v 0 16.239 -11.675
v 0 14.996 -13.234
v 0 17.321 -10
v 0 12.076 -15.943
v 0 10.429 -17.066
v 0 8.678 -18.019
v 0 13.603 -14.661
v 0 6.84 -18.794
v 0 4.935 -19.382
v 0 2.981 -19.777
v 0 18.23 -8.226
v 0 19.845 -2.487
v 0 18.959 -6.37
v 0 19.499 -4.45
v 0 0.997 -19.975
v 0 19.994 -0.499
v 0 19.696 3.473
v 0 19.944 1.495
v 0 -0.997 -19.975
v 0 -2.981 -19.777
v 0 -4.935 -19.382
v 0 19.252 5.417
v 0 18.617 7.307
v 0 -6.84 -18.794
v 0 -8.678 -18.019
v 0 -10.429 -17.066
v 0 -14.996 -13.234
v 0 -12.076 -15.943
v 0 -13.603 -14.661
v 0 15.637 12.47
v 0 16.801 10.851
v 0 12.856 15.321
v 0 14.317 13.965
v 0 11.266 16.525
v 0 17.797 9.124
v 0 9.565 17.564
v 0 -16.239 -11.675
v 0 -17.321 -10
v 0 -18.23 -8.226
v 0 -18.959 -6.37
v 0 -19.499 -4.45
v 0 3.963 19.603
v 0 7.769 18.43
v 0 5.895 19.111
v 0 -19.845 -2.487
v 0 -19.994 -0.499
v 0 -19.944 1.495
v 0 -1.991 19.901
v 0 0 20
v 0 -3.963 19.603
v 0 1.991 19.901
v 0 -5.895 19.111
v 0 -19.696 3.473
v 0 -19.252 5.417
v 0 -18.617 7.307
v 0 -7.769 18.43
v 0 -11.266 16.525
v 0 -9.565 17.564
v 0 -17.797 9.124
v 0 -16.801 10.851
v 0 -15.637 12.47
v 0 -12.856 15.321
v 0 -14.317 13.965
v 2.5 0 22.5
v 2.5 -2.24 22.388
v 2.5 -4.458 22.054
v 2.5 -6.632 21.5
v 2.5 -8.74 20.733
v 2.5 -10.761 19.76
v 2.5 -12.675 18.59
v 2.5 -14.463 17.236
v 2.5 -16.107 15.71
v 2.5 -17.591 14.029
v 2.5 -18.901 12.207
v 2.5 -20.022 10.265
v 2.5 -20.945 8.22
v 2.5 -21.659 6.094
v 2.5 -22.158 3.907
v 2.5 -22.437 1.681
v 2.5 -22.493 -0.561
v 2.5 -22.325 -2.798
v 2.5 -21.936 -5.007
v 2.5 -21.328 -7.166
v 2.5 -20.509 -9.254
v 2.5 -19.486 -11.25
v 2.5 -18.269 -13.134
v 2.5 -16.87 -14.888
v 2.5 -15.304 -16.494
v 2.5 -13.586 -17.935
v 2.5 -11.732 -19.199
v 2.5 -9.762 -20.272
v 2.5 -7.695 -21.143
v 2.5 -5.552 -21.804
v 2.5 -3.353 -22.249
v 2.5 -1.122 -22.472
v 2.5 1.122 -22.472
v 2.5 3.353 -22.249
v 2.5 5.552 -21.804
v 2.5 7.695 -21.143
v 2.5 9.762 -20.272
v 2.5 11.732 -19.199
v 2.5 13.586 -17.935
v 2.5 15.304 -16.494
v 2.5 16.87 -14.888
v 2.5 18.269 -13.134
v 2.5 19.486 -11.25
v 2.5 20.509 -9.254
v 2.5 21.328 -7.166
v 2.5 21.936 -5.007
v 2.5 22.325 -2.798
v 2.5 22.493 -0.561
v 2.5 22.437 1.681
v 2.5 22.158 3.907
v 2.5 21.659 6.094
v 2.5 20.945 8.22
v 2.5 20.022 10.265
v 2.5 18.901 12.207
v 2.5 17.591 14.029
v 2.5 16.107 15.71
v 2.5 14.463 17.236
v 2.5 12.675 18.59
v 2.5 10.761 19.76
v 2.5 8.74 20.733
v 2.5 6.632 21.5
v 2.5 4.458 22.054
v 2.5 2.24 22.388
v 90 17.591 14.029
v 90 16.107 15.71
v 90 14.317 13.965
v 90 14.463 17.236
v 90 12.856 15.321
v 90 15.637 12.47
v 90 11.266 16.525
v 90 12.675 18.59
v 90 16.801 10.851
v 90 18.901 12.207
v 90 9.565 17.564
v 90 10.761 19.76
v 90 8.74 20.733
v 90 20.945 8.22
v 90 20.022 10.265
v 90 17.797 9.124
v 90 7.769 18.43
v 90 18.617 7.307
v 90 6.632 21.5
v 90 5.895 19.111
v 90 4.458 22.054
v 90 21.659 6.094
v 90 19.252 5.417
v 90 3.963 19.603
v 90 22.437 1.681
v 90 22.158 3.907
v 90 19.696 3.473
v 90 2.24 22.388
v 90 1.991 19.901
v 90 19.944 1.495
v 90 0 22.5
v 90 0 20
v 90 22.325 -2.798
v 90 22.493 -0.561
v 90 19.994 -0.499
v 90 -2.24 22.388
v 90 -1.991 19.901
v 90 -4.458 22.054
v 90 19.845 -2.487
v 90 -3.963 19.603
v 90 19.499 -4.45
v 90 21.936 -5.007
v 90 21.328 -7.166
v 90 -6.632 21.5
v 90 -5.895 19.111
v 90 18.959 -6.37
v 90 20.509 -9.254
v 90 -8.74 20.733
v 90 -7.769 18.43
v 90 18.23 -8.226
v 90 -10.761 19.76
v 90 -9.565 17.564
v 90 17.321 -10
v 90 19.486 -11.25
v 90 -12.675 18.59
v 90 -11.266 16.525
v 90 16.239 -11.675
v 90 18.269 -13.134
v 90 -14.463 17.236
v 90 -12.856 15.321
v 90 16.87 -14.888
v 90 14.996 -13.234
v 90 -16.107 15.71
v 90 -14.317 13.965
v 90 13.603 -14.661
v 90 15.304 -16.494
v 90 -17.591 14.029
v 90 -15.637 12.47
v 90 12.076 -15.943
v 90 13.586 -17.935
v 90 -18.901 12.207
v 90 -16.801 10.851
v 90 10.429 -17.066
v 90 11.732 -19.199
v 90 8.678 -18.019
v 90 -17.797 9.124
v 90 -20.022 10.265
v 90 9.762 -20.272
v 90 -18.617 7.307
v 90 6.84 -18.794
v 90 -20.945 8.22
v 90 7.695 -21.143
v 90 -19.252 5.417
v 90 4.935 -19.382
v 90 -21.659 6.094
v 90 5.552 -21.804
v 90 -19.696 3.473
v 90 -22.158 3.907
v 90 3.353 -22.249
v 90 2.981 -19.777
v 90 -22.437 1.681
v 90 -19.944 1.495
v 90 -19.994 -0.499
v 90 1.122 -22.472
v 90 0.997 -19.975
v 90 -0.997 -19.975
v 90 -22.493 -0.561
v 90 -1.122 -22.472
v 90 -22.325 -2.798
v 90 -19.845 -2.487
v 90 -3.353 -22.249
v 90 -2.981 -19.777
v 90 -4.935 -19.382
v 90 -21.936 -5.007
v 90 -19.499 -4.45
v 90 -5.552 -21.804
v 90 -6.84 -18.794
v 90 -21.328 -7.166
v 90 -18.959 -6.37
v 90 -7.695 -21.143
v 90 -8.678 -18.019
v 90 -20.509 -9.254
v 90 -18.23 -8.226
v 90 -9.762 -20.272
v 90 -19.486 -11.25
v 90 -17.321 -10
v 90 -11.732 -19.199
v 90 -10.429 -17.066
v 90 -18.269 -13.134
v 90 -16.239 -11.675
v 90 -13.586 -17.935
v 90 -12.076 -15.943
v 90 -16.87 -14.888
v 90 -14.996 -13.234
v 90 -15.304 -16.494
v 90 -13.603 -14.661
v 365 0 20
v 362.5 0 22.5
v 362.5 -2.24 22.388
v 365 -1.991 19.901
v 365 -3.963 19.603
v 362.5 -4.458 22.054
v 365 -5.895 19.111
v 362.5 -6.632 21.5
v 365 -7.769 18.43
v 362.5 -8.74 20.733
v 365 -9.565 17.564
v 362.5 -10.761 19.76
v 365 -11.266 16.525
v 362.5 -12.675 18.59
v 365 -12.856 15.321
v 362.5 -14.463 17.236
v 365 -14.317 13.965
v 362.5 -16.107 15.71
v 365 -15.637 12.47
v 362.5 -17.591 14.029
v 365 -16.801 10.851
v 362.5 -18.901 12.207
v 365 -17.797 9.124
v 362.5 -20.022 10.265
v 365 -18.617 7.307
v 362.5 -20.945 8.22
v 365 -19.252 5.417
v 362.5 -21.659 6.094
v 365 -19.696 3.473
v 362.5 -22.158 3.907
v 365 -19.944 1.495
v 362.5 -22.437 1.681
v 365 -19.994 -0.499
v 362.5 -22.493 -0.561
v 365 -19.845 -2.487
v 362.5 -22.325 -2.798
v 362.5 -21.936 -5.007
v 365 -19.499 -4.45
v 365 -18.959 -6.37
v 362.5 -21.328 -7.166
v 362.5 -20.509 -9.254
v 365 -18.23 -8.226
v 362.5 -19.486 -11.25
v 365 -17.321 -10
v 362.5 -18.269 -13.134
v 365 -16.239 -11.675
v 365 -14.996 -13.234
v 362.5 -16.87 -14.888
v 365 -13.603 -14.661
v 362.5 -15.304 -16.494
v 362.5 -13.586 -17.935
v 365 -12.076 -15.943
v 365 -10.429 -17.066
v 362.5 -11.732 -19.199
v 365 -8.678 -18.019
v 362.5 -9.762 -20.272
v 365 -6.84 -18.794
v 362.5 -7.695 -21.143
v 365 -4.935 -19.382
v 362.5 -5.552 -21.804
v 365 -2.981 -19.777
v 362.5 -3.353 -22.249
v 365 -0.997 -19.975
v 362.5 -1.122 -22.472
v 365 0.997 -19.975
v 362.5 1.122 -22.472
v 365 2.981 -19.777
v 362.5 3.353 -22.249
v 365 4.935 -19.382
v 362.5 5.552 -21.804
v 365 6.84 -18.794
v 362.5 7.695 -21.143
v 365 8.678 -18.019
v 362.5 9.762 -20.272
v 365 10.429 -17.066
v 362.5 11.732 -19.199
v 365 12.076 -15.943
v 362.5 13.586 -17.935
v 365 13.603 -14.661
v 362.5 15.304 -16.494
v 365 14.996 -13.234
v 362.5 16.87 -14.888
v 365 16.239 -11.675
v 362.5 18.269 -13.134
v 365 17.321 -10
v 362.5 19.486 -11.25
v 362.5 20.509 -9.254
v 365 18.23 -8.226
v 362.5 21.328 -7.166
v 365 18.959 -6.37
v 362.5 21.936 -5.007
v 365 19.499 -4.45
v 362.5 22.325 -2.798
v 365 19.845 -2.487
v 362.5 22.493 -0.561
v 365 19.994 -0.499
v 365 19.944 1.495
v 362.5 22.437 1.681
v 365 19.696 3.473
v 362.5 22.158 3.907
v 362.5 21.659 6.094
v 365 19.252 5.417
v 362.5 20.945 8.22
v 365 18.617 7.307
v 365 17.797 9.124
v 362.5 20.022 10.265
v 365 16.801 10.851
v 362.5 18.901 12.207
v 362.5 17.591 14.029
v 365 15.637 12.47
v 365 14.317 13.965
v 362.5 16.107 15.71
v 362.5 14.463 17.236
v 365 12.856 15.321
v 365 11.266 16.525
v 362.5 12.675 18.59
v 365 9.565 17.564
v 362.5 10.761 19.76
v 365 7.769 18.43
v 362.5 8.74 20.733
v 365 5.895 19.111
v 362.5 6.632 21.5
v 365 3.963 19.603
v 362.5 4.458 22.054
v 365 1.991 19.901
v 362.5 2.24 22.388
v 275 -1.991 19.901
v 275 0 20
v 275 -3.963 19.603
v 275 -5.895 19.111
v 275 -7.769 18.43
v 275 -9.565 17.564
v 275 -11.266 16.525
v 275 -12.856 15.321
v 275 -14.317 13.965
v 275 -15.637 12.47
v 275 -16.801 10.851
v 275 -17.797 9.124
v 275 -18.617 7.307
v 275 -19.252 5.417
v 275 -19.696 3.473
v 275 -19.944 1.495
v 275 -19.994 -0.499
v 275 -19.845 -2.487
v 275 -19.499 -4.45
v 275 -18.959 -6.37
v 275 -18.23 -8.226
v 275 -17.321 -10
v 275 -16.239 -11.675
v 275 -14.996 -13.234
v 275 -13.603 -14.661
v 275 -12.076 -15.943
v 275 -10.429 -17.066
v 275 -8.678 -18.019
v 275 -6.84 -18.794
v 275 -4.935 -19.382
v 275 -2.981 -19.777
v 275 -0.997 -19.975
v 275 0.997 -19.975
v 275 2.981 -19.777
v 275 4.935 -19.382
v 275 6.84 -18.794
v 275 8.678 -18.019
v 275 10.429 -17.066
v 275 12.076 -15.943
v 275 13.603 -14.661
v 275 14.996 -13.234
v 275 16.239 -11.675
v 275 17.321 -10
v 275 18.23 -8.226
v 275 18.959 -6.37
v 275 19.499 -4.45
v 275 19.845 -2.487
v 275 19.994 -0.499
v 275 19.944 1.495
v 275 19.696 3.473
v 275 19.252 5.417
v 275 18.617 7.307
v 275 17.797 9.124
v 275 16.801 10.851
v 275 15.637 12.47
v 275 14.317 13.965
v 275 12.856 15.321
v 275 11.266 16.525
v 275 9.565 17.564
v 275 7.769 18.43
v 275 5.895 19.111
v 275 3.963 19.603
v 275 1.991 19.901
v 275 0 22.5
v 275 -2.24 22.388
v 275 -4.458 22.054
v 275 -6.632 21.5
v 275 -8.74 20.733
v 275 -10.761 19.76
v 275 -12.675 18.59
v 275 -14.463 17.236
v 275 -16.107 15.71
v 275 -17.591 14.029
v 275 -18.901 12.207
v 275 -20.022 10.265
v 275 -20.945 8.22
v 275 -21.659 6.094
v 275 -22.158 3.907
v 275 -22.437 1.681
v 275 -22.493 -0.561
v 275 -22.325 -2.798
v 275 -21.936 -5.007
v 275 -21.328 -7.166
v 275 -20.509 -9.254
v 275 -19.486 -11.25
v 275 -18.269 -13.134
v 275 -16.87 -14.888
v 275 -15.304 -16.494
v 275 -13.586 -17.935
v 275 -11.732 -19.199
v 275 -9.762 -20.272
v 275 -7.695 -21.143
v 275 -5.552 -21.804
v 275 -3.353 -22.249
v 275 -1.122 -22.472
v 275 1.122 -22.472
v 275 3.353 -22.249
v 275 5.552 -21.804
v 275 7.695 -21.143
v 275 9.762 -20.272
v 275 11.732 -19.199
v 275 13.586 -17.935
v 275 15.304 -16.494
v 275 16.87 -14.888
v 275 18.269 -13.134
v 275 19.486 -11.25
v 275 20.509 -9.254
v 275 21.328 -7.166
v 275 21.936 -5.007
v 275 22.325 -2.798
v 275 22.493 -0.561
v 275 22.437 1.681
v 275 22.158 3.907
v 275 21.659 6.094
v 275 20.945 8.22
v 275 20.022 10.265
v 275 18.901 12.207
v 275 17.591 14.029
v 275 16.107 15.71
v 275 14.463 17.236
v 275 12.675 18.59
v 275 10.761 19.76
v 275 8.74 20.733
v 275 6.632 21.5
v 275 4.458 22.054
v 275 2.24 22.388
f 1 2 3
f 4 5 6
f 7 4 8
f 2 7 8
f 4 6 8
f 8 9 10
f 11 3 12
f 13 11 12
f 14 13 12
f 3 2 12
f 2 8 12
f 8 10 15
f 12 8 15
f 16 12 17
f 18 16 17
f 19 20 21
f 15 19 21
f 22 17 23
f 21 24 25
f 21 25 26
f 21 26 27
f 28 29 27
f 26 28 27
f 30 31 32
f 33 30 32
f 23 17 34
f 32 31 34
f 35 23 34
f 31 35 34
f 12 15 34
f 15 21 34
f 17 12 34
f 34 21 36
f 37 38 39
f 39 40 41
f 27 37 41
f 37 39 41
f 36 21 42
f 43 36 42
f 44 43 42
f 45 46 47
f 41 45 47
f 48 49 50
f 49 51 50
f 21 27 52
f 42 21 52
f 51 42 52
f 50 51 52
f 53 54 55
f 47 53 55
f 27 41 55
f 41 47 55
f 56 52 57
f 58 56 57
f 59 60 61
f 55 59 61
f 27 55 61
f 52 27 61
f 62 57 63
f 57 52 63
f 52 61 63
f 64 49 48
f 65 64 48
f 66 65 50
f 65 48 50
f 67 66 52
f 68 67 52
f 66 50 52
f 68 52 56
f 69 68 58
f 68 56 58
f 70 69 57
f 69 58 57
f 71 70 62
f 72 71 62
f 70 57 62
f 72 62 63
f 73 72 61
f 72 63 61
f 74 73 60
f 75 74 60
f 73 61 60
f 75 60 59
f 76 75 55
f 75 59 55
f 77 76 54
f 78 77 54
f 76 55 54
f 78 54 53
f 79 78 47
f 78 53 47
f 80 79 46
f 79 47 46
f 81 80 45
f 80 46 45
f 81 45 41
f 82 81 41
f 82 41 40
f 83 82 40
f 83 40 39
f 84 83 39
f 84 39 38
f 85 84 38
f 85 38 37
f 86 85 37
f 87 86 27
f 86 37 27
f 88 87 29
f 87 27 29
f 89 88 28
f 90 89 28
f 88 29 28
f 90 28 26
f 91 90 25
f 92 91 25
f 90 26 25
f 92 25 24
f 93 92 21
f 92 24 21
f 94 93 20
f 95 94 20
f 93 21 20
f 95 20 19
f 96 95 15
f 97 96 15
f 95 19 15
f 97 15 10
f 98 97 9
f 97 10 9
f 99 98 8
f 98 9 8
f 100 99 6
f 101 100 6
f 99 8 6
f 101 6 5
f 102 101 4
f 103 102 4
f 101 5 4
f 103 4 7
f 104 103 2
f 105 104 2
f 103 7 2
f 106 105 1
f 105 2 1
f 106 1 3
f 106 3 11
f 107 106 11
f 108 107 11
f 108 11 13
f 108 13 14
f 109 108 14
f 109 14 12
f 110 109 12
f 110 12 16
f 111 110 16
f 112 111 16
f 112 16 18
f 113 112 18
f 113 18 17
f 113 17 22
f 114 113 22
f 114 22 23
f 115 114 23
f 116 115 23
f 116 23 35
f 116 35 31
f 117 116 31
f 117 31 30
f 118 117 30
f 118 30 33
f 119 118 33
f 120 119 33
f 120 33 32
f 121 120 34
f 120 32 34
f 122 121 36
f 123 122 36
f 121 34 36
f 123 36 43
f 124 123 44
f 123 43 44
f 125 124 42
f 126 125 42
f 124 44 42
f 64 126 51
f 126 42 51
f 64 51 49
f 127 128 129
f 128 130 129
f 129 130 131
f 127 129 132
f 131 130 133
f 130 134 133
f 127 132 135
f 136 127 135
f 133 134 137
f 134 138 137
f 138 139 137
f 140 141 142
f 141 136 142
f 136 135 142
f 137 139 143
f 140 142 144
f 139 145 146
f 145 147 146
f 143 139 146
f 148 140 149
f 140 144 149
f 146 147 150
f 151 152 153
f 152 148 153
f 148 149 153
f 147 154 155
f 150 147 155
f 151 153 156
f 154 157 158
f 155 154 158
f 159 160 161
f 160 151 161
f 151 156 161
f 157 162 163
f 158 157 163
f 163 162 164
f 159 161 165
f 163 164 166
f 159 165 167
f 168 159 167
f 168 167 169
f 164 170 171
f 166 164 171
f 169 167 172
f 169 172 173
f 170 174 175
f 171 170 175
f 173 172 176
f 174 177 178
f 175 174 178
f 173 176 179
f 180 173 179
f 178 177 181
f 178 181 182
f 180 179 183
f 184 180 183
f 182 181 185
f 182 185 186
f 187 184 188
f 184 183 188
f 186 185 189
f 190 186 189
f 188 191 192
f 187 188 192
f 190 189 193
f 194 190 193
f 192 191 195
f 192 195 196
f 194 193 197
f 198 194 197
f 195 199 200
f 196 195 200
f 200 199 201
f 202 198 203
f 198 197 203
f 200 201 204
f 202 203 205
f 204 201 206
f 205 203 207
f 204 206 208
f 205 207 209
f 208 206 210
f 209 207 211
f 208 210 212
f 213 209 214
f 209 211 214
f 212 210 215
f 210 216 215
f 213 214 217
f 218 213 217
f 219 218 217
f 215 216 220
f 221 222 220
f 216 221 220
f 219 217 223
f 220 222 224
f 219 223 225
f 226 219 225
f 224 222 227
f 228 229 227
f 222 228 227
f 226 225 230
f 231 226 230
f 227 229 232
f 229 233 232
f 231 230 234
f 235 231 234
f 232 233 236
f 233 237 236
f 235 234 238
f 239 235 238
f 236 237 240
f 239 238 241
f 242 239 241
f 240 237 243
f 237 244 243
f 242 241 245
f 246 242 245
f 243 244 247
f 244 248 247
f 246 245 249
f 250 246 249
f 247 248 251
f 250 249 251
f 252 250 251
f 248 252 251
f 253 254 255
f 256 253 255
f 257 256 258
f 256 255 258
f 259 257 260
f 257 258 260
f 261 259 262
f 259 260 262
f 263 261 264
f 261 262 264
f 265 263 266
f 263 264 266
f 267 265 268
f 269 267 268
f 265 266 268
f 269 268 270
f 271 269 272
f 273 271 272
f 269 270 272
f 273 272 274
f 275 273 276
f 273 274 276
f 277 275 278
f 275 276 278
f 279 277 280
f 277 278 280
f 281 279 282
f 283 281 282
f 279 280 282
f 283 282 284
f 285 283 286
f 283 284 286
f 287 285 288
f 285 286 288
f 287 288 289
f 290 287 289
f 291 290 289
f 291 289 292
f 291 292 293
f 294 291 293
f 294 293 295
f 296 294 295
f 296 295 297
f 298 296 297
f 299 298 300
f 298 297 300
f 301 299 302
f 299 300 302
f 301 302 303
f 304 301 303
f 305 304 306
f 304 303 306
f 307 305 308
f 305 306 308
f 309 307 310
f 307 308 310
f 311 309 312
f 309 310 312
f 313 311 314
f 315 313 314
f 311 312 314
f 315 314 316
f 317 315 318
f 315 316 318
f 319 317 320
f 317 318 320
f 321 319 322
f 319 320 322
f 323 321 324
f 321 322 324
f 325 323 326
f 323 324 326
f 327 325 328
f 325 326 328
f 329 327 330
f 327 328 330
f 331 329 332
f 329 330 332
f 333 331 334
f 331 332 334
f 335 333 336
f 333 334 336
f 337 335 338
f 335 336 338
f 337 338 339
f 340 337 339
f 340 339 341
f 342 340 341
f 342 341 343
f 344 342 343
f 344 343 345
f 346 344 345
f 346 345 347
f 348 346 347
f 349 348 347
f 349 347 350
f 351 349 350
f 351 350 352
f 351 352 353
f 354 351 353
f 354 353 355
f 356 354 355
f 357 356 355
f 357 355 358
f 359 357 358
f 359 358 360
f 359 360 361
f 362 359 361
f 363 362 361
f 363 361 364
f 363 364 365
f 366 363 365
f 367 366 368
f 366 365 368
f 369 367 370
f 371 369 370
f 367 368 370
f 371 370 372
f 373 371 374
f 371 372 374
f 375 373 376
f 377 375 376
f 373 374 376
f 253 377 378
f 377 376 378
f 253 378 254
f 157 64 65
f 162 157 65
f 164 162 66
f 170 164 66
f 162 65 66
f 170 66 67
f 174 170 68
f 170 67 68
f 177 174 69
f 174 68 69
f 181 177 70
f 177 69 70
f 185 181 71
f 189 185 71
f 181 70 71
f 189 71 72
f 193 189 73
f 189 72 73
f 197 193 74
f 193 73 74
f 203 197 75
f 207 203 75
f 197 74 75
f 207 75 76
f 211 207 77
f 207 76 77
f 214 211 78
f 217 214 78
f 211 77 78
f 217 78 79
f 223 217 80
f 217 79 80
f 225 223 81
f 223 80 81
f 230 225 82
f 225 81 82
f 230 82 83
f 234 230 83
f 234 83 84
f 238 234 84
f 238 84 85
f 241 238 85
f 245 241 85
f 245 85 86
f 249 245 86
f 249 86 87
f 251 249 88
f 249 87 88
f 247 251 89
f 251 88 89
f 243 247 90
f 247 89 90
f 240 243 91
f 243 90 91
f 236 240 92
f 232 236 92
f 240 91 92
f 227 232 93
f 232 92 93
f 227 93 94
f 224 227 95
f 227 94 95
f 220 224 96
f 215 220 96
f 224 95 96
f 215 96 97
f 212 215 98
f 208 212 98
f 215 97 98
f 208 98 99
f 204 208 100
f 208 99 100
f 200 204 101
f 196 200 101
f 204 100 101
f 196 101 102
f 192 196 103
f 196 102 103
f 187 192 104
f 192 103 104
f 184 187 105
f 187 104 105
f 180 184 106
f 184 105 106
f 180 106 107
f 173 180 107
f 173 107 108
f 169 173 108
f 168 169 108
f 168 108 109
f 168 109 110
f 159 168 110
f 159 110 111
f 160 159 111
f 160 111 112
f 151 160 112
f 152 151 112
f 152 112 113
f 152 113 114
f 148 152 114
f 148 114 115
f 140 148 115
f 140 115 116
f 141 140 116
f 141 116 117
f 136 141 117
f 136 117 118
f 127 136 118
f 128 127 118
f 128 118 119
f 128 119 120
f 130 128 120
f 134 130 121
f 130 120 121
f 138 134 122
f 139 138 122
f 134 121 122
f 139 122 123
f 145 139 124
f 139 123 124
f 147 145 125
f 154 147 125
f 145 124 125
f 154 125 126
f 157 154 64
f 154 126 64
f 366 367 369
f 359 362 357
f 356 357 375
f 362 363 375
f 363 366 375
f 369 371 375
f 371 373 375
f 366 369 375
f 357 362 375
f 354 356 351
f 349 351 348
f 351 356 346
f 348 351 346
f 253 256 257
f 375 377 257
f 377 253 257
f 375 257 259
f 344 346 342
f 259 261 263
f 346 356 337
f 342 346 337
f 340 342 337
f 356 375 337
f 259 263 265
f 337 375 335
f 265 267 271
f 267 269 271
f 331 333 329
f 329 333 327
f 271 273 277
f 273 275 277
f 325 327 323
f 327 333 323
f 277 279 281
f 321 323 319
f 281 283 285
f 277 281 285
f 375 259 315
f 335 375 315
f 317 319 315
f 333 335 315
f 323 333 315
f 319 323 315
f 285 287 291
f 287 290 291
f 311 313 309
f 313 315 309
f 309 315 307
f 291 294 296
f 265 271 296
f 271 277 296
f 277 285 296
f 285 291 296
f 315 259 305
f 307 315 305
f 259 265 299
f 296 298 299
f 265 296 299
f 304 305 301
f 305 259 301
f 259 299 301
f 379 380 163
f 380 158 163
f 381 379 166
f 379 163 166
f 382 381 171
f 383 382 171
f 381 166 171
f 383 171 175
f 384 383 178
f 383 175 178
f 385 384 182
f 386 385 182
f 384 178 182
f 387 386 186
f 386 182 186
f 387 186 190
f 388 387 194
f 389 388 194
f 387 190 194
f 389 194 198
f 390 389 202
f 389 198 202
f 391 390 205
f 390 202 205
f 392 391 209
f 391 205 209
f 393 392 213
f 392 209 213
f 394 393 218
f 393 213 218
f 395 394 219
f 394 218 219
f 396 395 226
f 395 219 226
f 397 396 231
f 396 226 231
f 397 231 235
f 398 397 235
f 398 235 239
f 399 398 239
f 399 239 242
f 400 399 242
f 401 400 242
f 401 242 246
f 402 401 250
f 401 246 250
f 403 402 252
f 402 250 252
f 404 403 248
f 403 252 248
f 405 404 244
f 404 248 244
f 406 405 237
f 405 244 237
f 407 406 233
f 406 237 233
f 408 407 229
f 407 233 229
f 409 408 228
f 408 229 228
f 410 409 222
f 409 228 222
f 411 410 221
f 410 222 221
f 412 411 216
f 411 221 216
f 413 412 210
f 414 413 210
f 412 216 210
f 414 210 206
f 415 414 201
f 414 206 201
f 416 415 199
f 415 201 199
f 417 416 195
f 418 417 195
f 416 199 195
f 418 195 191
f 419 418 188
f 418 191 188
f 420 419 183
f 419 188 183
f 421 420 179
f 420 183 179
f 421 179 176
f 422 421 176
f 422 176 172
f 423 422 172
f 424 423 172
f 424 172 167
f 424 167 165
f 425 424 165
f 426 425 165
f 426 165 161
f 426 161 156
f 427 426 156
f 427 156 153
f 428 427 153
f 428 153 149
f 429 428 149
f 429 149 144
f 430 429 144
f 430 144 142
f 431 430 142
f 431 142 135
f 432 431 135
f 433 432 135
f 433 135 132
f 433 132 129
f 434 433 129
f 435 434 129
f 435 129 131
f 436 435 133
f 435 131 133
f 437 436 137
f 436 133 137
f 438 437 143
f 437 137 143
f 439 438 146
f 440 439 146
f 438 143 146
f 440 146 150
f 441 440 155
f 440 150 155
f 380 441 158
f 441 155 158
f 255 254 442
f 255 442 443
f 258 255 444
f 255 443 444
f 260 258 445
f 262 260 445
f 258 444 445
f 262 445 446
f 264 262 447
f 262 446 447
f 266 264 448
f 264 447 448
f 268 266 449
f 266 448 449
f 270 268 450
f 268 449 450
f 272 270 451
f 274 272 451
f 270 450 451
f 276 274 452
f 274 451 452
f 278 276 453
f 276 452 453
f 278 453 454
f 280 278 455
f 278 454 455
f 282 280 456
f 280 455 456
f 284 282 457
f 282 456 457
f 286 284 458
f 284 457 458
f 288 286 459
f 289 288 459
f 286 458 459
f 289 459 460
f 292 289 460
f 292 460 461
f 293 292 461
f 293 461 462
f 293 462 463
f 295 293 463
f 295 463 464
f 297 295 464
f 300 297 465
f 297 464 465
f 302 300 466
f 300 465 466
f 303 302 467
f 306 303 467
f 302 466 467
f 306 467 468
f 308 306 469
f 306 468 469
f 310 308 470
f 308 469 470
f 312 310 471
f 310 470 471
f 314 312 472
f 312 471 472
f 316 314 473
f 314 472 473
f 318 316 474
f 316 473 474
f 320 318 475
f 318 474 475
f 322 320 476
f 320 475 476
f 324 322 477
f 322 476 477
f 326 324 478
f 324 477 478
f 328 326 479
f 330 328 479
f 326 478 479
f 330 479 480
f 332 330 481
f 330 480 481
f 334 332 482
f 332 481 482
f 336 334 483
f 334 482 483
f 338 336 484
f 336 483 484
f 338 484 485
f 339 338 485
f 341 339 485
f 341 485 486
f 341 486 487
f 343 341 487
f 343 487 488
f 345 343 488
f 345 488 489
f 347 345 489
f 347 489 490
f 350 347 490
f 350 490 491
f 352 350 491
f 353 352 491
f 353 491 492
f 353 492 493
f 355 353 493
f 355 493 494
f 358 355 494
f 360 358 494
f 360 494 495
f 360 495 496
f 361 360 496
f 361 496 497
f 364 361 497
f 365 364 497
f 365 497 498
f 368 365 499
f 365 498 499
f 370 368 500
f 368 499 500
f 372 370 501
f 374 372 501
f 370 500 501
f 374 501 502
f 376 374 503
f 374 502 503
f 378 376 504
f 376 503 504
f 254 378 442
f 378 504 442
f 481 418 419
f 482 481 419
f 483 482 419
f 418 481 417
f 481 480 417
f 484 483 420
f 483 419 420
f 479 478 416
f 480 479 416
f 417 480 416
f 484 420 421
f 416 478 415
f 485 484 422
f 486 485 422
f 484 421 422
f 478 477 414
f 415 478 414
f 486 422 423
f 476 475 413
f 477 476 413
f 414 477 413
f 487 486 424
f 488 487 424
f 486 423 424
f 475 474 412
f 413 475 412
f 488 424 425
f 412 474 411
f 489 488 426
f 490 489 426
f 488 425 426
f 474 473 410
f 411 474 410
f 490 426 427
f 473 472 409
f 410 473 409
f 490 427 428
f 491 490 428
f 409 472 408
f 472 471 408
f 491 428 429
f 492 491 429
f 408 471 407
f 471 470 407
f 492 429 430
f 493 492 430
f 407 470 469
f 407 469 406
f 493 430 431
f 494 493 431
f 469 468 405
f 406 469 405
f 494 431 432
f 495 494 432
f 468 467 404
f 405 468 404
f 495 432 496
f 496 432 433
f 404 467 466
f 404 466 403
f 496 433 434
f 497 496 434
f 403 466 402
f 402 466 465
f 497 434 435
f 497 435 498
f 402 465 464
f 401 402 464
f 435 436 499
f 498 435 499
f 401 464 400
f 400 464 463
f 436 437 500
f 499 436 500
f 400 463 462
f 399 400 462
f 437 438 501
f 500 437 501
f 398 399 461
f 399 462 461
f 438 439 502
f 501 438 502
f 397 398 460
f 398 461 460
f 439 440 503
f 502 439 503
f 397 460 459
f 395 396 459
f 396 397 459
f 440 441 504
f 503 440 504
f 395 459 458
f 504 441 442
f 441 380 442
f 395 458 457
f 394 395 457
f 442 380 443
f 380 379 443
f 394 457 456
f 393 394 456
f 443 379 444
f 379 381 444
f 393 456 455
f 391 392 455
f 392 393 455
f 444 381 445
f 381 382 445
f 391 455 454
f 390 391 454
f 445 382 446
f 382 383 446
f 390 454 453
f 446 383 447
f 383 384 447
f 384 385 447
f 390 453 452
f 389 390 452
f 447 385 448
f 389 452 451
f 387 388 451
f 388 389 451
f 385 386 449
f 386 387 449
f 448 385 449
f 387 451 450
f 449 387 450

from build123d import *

# Parameters (mm, degrees)
CHAMFER1_SIZE = 2.5


with BuildPart() as part:
    # Sketch1 → Revolve1 (revolve)
    with BuildSketch(Plane(origin=(0, 0, 0), x_dir=(1, 0, 0), z_dir=(0, 1, 0)), mode=Mode.PRIVATE) as revolve1_sk:
        Polygon((365, 0), (365, 22.5), (275, 22.5), (275, 20), (90, 20), (90, 22.5), (0, 22.5), (0, 0), align=None)
    revolve(revolve1_sk.sketch.rotate(Axis((-60.584183673, 0, 0), (1, 0, 0)), 180), axis=Axis((-60.584183673, 0, 0), (1, 0, 0)))

    # Chamfer1
    chamfer1_edges = [part.edges().sort_by_distance(p)[0] for p in [
        (0, 0, -22.5),
        (365, 0, -22.5),
    ]]
    chamfer(chamfer1_edges, length=CHAMFER1_SIZE)


solid = part.part
